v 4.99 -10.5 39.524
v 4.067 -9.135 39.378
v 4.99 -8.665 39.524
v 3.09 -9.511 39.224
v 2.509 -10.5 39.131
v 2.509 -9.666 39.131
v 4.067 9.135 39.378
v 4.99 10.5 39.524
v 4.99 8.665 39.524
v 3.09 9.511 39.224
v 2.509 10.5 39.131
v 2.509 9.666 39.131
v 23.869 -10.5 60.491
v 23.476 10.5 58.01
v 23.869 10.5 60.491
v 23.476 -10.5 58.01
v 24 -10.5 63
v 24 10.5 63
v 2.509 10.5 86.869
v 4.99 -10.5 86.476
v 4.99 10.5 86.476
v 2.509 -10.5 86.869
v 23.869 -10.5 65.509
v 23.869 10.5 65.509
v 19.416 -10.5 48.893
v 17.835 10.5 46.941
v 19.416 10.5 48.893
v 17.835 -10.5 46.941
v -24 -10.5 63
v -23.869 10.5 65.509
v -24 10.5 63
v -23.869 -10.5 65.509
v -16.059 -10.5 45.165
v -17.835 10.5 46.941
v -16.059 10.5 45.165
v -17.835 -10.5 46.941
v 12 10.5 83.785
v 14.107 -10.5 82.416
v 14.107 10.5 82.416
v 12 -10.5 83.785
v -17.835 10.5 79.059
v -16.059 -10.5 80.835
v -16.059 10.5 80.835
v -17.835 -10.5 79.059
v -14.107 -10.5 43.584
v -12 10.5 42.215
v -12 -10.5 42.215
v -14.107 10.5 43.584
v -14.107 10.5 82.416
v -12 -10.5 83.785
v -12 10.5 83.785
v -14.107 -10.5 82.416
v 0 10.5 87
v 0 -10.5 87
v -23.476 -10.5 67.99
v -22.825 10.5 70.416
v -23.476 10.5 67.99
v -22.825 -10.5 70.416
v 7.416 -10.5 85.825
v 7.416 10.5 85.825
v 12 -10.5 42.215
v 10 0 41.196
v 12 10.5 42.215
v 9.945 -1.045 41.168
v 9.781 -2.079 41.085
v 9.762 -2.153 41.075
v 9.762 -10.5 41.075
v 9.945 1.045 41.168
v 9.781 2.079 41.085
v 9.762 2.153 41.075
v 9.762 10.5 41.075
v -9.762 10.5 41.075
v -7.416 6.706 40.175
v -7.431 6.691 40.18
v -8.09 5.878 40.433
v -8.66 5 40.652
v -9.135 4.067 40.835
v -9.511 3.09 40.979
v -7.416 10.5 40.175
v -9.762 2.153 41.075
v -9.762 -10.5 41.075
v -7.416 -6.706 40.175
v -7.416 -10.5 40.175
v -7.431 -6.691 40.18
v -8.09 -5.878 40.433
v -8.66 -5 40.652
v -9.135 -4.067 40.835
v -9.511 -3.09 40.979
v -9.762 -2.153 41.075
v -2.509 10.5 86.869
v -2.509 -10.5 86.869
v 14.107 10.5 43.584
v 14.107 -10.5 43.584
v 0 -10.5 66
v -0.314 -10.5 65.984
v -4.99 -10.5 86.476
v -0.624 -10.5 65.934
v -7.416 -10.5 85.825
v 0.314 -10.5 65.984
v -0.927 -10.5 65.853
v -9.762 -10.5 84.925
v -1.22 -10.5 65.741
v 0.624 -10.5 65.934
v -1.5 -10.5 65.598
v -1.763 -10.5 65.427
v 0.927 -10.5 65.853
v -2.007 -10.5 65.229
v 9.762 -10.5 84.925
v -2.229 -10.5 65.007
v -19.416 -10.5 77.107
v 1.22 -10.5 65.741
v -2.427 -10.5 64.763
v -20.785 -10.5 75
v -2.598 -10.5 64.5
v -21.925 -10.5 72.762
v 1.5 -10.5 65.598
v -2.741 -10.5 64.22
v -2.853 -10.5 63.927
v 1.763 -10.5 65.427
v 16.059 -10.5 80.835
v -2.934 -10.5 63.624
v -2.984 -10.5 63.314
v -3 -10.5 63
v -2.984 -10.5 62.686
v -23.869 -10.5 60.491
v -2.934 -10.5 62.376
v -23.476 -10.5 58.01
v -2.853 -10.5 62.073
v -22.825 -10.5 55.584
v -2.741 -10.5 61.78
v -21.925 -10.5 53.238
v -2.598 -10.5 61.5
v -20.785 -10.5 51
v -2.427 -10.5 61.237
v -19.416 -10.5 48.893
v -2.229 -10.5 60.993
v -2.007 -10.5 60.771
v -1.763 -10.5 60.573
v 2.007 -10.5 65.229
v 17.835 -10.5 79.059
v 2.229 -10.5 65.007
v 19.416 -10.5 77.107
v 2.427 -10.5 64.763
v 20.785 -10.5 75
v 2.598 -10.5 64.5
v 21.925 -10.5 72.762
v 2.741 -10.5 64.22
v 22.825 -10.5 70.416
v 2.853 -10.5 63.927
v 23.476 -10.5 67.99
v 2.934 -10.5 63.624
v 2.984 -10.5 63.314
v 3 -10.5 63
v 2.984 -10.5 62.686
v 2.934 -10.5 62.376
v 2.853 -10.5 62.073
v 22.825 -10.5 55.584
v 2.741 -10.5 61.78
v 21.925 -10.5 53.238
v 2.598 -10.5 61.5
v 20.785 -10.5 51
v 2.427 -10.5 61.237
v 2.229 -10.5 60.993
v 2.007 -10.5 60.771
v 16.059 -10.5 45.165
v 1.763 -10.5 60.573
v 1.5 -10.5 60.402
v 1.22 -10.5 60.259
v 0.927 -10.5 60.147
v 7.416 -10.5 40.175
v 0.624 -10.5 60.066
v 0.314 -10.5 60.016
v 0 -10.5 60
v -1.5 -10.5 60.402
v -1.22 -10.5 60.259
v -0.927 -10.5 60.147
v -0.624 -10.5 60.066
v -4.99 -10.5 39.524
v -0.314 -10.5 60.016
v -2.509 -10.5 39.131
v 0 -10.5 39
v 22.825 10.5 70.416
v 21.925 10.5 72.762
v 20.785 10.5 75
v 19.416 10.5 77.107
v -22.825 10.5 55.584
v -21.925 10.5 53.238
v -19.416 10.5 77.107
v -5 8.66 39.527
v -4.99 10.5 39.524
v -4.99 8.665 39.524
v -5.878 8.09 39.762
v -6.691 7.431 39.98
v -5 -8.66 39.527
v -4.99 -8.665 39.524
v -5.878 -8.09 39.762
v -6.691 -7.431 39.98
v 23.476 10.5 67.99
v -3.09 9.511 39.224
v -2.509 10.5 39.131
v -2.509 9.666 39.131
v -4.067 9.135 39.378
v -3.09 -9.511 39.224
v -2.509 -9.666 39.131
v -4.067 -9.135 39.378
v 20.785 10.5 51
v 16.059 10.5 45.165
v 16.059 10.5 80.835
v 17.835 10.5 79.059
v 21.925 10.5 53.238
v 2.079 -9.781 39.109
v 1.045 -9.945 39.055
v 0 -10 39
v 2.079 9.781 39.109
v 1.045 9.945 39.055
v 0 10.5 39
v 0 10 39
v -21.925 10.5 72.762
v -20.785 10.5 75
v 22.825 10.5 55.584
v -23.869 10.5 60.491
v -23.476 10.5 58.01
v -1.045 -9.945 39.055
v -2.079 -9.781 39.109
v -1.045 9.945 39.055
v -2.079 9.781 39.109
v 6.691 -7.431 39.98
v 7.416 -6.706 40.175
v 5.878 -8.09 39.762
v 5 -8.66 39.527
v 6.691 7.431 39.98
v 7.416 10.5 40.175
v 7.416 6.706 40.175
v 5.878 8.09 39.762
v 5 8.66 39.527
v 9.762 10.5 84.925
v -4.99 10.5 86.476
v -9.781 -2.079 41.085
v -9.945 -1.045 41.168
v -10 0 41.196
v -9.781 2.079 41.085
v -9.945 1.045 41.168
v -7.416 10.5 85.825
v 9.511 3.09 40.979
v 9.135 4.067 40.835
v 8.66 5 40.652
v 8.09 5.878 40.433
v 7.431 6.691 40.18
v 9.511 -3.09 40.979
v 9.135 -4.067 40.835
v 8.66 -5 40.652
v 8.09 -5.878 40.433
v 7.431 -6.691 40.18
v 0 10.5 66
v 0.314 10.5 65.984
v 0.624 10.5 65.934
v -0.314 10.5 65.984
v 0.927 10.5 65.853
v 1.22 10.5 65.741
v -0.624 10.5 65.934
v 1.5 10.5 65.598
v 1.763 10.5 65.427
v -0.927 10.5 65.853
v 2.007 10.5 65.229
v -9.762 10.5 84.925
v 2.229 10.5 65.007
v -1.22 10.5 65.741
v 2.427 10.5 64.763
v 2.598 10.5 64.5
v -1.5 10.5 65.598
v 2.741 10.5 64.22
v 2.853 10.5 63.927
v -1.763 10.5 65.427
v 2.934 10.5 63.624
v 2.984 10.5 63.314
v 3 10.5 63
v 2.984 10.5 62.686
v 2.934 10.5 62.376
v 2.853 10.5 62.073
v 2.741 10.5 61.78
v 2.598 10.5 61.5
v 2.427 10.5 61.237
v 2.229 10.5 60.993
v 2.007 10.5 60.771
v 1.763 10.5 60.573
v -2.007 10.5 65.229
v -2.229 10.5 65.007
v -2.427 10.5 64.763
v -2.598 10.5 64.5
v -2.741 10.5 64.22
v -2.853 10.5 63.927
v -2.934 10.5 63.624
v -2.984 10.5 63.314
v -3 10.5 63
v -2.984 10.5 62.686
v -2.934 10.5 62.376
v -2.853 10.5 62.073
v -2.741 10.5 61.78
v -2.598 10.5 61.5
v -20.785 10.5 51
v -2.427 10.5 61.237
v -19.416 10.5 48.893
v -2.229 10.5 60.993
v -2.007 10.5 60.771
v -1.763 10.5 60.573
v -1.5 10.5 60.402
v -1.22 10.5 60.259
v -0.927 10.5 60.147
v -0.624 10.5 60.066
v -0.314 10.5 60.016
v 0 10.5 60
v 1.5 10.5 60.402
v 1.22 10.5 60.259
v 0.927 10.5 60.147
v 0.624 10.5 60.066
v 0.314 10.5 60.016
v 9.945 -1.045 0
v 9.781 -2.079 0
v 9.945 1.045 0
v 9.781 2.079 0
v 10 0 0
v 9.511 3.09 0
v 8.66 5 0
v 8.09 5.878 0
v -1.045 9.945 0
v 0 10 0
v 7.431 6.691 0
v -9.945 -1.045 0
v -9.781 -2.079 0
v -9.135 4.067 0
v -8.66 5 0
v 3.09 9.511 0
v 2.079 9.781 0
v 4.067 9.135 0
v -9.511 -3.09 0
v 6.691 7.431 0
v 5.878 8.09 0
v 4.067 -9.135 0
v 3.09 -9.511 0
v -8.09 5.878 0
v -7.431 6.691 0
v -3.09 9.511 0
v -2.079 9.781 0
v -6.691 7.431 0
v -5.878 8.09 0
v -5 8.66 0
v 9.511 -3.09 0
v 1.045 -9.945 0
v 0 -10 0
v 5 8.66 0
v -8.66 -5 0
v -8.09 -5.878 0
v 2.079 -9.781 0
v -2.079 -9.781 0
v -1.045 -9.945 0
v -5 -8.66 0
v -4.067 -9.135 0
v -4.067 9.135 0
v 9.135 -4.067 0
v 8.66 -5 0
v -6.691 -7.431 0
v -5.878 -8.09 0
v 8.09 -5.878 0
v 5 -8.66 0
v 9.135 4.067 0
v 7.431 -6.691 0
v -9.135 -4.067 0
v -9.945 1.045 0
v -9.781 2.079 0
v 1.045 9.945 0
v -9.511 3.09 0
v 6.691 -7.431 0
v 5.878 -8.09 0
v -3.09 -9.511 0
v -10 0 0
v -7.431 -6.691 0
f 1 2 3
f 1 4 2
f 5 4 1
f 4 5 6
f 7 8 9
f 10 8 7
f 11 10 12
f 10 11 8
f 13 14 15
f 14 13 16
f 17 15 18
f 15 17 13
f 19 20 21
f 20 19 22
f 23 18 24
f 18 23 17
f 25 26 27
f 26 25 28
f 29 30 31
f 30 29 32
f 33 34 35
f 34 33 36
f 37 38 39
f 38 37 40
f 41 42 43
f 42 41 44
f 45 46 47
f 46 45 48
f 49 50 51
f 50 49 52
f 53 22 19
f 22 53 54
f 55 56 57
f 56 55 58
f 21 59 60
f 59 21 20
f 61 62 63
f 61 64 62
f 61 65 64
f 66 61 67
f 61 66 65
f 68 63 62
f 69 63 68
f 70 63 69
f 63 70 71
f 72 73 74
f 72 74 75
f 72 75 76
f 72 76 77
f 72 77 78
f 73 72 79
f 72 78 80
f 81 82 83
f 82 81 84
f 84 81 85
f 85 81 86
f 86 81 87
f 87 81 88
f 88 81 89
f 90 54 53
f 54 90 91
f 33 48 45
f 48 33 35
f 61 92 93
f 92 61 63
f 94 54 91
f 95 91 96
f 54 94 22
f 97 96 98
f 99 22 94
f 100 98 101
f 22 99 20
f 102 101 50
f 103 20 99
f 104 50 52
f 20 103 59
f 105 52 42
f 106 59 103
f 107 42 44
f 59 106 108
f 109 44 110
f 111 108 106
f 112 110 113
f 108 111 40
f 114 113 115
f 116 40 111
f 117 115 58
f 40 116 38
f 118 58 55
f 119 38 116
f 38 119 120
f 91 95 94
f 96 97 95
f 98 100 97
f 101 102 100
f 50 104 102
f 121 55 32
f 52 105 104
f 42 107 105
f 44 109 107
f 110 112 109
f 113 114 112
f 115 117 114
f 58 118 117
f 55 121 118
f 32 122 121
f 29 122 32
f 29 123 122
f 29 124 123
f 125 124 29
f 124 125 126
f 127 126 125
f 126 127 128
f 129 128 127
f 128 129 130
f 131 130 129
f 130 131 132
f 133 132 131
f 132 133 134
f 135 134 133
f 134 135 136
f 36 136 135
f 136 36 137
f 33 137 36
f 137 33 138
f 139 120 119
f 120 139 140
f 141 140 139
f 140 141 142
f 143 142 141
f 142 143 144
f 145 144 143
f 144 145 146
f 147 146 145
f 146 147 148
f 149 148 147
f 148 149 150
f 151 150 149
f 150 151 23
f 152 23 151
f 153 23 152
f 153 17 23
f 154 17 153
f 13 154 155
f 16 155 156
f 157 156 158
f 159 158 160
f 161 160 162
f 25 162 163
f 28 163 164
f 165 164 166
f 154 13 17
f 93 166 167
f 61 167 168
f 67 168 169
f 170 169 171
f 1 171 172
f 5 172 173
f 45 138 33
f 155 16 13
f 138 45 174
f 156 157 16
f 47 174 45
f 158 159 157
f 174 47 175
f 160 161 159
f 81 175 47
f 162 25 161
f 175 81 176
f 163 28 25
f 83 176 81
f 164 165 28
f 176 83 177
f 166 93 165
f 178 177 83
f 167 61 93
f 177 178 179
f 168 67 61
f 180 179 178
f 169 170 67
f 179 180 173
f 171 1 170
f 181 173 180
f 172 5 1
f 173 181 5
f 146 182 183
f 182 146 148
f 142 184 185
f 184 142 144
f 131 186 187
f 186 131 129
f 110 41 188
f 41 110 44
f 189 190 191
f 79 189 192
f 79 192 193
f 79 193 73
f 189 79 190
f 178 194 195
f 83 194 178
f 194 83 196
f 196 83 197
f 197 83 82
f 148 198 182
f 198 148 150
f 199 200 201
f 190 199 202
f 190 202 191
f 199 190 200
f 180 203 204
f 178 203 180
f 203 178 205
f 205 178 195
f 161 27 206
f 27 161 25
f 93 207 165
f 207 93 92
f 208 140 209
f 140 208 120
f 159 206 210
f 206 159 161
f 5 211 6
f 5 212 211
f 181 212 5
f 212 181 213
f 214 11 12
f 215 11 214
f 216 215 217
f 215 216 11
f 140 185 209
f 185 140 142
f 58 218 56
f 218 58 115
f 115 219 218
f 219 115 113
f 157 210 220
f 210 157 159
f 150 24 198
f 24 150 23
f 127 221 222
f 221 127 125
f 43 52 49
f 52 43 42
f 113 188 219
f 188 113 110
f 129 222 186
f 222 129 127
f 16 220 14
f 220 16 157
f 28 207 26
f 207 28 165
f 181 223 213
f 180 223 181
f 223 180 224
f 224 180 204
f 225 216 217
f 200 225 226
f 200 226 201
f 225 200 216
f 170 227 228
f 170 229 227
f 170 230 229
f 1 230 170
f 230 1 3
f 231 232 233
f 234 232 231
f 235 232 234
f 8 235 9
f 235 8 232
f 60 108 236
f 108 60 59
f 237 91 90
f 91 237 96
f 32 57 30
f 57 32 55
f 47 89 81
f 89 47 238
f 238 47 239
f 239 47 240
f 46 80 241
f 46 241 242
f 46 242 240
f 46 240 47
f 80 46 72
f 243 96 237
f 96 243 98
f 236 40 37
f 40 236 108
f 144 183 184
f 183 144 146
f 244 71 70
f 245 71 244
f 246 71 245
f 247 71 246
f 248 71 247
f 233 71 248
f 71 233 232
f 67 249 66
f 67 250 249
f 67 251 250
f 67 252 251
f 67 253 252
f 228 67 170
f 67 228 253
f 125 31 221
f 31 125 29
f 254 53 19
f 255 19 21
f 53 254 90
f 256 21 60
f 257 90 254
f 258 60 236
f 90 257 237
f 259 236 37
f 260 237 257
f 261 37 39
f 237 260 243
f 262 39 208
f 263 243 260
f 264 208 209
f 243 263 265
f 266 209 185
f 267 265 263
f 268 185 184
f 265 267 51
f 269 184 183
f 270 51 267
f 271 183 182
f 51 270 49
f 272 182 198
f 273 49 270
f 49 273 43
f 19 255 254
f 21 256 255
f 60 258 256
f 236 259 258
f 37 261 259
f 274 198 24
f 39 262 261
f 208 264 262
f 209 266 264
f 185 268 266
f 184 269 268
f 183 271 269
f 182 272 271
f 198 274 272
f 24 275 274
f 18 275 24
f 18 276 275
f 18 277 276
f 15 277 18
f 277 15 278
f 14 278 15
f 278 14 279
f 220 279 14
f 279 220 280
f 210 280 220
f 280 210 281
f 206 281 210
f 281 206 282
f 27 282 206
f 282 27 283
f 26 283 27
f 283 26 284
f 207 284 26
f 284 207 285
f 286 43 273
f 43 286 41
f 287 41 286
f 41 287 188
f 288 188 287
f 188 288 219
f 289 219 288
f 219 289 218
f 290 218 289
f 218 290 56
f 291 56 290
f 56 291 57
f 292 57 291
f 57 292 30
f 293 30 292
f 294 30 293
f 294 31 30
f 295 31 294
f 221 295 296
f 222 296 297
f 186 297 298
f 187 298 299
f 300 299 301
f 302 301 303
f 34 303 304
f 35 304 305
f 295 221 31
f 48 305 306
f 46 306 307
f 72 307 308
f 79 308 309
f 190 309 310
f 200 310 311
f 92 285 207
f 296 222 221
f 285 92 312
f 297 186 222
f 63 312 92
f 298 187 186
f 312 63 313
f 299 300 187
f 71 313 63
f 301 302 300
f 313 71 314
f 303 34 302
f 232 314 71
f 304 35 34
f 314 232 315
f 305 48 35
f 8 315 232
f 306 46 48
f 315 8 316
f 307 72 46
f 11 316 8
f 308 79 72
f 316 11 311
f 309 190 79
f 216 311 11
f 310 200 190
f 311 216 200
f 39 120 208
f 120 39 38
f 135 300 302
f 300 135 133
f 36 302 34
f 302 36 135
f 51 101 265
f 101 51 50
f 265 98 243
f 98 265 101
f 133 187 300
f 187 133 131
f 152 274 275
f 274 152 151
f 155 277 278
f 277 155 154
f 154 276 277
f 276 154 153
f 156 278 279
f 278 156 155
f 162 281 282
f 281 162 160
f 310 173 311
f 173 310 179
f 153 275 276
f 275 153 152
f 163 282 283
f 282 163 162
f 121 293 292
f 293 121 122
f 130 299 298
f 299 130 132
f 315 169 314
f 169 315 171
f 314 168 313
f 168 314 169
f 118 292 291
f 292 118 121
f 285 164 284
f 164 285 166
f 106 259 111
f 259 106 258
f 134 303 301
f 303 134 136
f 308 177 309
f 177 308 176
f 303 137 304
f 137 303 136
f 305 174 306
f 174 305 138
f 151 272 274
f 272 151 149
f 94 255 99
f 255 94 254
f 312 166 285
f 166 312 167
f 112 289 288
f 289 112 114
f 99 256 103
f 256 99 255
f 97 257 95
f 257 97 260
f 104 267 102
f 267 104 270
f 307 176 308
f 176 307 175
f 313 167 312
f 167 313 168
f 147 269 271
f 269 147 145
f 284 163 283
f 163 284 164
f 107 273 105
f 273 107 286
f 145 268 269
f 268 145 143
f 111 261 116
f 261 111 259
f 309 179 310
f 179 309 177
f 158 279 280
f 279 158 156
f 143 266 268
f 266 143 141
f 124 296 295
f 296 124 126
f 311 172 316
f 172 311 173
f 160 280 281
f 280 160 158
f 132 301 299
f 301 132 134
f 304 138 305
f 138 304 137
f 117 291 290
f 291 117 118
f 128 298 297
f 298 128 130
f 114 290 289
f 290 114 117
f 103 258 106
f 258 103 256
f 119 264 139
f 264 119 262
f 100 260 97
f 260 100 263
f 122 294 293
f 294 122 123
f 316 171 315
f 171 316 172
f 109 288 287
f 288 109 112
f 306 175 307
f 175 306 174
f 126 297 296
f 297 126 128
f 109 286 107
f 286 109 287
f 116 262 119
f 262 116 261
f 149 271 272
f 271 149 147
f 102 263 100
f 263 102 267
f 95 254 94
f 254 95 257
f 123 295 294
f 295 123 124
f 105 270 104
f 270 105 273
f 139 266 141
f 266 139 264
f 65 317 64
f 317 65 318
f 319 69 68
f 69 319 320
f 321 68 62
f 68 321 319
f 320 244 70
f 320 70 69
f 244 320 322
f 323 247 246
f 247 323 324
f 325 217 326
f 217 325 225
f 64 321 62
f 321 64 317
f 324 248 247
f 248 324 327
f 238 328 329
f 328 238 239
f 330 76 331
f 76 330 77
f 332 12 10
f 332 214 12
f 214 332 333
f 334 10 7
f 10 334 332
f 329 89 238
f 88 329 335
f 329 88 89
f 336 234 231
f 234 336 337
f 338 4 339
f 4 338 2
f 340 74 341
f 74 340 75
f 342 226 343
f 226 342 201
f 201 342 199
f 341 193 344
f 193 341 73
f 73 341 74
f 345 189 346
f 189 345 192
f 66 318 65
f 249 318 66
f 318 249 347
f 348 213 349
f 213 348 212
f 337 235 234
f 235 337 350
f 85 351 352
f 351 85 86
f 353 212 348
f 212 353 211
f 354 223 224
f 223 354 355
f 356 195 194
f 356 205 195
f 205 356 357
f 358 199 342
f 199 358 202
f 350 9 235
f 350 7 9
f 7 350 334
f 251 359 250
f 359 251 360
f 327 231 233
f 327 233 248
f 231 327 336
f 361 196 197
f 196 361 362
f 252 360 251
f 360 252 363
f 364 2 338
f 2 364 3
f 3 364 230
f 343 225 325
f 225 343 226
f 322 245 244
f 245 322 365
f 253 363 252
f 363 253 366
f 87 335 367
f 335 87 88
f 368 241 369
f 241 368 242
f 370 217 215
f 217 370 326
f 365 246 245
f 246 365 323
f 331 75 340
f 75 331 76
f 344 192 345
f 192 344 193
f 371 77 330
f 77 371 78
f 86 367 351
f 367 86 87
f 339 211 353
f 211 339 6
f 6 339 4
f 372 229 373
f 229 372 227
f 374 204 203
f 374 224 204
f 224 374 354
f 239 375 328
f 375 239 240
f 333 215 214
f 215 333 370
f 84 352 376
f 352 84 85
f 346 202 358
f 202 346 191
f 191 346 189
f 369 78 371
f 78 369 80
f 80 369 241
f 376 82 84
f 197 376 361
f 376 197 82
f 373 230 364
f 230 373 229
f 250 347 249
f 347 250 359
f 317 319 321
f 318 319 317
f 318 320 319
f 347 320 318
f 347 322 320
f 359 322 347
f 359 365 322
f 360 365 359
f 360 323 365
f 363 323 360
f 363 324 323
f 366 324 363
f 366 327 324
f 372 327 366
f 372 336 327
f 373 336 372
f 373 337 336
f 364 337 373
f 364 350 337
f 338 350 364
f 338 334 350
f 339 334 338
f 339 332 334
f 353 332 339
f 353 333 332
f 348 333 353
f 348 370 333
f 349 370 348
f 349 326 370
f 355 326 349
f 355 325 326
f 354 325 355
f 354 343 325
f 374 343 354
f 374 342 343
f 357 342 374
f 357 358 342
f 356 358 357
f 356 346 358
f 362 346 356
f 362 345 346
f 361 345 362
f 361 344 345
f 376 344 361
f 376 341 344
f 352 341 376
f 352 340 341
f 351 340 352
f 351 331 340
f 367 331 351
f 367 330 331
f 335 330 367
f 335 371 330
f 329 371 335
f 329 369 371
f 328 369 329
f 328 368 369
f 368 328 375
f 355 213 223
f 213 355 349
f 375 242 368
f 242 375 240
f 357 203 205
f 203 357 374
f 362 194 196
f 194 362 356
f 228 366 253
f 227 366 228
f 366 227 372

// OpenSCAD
// Flat-eye bolt with a smooth shaft.
$fn = 60;
eps = 0.02;
shaft_d = 20;
shaft_l = 40;
eye_outer_d = 48;
eye_inner_d = eye_outer_d - 2 * 21;
eye_t = 21;
module eye() {
    translate([0, -eye_t / 2, shaft_l + eye_outer_d / 2 - 1]) rotate([-90, 0, 0])
        difference() { cylinder(d = eye_outer_d, h = eye_t); translate([0, 0, -eps]) cylinder(d = eye_inner_d, h = eye_t + 2 * eps); }
}
union() { cylinder(d = shaft_d, h = shaft_l + 2); eye(); }
